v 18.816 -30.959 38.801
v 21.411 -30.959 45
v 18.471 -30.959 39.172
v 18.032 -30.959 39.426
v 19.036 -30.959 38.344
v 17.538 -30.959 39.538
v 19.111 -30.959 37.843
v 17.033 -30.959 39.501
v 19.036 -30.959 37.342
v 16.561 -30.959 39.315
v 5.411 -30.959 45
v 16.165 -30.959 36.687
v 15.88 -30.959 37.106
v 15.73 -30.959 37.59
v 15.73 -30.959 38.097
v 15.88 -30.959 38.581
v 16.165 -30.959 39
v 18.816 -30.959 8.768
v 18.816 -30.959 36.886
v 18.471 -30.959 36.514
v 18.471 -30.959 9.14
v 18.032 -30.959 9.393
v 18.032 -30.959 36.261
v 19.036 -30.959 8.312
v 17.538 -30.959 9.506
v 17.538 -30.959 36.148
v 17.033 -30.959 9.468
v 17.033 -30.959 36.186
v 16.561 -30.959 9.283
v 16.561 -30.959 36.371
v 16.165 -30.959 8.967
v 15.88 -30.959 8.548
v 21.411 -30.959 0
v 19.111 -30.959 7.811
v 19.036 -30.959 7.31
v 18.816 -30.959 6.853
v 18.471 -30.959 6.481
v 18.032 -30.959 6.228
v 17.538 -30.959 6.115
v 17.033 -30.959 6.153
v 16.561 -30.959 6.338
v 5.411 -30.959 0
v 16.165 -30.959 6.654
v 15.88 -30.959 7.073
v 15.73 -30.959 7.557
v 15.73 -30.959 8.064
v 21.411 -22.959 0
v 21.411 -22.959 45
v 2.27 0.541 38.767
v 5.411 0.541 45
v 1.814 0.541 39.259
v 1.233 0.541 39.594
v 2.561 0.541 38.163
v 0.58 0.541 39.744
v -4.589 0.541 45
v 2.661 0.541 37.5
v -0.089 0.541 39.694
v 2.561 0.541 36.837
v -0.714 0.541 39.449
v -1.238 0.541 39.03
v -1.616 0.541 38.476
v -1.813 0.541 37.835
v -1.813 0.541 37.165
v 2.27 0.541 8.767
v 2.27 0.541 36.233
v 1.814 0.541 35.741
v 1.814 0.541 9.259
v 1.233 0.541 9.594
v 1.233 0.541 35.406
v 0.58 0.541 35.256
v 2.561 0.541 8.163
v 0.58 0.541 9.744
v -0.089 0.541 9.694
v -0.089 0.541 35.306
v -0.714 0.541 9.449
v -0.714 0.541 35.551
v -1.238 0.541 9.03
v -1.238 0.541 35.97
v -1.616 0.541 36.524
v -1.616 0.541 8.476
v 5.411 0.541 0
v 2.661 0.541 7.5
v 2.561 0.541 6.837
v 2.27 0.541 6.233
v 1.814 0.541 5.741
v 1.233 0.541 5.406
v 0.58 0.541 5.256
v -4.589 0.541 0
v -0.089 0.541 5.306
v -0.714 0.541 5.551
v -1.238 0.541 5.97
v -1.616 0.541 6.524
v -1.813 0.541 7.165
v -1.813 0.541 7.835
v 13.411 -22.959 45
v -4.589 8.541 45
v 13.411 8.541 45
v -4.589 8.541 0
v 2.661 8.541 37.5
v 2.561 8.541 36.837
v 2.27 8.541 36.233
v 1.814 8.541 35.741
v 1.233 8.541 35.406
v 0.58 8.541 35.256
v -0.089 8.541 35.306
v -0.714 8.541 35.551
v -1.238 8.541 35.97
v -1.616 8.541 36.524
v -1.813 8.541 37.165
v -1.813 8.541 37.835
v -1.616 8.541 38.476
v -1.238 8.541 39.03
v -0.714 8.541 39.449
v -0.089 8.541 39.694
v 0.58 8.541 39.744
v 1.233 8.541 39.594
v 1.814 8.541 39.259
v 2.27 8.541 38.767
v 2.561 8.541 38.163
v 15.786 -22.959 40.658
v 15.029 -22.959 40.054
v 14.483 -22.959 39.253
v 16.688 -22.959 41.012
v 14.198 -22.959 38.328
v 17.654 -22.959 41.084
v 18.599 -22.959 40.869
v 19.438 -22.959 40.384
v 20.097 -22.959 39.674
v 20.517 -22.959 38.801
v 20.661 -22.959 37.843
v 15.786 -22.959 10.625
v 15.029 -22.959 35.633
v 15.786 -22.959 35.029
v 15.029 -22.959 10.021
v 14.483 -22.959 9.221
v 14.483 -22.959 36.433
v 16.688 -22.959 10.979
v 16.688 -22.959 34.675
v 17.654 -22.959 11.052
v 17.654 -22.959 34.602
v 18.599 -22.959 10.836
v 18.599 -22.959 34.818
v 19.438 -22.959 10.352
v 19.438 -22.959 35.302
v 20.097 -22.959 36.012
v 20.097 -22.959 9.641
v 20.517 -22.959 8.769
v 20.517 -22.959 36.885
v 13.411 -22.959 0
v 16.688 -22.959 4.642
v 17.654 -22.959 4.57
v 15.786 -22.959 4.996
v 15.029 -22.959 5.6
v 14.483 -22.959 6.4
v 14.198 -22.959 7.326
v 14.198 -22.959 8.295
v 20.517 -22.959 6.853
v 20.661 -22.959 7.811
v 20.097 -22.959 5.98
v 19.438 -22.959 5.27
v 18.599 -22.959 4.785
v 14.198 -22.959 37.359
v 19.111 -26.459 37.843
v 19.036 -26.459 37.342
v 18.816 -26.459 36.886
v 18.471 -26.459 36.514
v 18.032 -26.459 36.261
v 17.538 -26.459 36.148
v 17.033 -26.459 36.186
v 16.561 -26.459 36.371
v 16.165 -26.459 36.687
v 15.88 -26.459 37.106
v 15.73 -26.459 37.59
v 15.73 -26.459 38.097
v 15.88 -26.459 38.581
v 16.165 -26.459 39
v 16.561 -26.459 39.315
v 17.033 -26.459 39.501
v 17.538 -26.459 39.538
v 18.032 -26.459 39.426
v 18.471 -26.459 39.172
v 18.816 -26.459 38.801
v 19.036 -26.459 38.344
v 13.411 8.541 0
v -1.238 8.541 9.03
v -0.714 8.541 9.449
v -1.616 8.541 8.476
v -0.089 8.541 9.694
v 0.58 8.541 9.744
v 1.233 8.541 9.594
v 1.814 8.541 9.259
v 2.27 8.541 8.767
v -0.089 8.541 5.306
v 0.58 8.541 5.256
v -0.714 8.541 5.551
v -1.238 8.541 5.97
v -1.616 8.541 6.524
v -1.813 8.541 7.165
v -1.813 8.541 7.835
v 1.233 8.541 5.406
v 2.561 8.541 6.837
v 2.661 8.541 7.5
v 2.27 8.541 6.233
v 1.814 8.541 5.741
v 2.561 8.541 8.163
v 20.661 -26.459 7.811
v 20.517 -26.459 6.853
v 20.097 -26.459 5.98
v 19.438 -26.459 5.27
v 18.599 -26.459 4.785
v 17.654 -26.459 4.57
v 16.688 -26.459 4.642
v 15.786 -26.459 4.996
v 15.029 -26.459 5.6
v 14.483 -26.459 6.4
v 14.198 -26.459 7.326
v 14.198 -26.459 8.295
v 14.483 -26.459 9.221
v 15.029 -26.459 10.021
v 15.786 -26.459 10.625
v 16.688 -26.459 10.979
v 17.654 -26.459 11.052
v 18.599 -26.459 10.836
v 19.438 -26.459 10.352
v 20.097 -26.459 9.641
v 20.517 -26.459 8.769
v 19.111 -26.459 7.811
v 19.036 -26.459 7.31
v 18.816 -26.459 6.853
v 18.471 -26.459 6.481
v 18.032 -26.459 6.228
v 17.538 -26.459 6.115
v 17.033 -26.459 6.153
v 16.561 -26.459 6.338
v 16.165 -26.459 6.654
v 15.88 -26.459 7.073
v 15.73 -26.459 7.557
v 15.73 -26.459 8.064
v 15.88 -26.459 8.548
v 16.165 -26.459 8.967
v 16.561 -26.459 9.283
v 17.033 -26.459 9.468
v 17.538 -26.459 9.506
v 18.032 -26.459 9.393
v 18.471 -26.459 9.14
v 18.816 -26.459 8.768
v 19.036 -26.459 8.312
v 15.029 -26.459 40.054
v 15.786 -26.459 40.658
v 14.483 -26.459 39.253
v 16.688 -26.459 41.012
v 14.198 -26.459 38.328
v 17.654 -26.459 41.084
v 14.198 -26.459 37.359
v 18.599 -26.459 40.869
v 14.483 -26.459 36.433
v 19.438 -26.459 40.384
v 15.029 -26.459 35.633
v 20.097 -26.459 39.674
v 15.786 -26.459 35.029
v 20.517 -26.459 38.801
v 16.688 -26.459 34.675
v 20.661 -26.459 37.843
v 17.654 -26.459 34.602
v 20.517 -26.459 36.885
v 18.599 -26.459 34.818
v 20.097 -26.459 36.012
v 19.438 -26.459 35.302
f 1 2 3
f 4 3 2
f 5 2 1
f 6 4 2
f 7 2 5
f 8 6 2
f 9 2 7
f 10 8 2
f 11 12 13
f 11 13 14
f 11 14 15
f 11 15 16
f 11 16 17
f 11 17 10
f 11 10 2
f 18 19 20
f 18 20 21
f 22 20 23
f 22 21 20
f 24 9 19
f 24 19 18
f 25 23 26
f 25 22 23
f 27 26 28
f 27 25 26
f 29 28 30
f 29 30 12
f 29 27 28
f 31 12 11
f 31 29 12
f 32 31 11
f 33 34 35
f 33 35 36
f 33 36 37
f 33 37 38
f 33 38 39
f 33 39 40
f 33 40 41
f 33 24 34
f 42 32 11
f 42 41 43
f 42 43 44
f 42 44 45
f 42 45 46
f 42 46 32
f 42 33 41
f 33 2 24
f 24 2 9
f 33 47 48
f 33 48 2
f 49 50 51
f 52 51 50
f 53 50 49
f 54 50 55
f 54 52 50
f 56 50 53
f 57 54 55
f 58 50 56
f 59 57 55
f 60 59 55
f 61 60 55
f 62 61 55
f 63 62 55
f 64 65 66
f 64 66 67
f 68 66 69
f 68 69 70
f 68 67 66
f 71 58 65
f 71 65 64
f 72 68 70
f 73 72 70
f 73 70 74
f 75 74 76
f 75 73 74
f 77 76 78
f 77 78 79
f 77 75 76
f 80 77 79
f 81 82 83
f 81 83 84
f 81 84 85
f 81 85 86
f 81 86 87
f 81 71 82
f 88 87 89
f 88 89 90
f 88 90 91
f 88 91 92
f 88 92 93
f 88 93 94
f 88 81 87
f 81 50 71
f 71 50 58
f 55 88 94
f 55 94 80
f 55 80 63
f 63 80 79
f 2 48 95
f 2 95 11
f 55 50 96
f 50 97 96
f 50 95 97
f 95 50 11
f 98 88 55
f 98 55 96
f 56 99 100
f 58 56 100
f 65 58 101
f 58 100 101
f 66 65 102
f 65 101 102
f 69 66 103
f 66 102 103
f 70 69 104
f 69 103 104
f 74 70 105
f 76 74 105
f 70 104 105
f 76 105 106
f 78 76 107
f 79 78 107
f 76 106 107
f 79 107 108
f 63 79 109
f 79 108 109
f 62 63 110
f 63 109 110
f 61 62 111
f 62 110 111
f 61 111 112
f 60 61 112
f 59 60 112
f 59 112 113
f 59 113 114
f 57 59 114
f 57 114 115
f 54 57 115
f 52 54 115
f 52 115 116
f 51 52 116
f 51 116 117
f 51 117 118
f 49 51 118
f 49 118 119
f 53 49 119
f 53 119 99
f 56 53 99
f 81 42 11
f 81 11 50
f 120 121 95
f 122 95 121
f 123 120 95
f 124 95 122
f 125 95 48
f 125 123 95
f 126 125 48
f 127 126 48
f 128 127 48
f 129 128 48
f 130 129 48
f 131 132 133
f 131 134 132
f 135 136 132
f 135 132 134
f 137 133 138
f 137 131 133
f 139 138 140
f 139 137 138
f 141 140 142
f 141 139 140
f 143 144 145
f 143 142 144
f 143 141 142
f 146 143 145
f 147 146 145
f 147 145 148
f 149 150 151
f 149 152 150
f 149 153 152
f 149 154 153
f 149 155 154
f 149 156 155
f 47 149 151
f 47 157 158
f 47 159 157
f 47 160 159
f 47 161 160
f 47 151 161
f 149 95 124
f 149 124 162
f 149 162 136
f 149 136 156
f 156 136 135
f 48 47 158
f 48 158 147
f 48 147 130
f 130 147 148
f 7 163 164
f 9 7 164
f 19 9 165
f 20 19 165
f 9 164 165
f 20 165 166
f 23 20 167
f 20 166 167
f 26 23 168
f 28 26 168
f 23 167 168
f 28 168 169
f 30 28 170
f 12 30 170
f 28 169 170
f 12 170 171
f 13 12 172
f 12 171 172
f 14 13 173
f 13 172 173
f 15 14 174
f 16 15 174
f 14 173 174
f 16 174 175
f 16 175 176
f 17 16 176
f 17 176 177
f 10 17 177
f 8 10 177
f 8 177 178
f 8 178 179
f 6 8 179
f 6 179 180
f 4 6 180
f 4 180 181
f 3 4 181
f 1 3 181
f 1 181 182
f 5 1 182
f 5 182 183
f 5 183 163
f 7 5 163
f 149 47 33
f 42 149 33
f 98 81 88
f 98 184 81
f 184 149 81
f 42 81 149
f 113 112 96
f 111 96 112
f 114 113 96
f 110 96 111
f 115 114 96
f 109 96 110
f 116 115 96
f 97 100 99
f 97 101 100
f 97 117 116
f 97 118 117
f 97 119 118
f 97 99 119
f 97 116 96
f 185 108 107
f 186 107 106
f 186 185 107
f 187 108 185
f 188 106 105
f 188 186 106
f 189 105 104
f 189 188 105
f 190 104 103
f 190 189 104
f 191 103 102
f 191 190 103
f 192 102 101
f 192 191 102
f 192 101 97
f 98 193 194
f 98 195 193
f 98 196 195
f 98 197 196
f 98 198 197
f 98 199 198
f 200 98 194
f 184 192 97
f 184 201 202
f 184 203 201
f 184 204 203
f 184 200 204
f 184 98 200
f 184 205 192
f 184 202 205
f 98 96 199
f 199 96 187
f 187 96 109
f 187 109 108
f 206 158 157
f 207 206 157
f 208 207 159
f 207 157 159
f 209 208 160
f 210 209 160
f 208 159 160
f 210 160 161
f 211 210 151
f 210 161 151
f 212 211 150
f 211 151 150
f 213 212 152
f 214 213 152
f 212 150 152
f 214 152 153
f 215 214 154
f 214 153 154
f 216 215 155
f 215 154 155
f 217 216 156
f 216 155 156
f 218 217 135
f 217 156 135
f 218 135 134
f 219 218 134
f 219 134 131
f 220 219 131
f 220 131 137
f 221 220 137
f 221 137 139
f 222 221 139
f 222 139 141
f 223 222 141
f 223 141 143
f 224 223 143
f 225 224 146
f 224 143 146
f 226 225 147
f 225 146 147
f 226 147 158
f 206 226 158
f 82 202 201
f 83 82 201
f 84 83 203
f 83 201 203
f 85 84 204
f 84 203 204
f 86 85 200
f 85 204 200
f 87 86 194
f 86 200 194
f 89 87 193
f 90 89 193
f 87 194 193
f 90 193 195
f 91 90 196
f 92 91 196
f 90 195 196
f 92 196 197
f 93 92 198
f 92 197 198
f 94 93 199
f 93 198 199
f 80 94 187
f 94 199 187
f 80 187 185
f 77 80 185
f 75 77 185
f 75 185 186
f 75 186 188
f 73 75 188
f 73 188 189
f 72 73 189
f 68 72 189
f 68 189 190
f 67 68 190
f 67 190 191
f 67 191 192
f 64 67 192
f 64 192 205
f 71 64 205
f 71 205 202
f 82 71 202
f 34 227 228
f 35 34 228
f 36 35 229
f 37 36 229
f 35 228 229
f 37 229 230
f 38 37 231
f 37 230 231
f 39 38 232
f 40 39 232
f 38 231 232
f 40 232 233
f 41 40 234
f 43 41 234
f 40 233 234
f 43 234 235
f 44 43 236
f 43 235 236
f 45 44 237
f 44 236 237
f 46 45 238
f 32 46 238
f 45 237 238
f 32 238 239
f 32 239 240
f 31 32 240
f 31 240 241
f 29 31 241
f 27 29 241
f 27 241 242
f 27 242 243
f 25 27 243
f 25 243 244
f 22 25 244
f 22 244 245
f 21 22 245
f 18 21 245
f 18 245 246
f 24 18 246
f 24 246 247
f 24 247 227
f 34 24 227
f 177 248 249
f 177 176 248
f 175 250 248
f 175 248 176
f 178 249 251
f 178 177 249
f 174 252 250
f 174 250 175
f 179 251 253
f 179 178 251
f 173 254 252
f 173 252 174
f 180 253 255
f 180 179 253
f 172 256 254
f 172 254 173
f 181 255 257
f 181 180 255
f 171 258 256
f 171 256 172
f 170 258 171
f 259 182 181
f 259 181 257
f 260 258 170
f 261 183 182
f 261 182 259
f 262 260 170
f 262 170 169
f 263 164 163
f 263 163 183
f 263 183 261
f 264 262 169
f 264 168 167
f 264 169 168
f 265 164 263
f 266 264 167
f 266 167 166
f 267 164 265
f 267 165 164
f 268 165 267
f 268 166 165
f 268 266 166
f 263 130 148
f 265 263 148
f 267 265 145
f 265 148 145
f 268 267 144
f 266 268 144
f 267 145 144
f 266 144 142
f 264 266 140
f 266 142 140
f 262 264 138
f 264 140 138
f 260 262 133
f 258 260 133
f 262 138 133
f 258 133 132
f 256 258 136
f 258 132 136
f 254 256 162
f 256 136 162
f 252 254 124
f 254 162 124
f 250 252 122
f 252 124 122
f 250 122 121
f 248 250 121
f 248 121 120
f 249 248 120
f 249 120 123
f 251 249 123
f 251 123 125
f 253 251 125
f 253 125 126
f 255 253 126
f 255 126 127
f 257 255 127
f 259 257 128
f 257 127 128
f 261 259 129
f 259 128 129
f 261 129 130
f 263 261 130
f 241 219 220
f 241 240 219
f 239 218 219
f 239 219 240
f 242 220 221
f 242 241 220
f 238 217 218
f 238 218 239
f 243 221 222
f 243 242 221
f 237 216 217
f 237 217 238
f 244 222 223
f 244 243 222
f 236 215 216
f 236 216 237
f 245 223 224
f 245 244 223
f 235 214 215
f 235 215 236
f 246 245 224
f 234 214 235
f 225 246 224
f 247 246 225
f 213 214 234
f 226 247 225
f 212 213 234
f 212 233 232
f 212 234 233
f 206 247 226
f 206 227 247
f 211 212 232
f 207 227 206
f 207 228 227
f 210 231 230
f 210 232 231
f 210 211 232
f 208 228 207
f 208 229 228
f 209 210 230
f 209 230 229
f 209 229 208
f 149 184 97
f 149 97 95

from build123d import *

# Parameters (mm, degrees)
BOSS_EXTRUDE1_DEPTH = 45
SKETCH2_R           = 2.25
CUT_EXTRUDE1_DEPTH  = 45
SKETCH3_R           = 1.7
CUT_EXTRUDE2_DEPTH  = 45
SKETCH4_R           = 3.25
CUT_EXTRUDE3_DEPTH  = 3.5


with BuildPart() as part:
    # Sketch1 → Boss-Extrude1 (new body)
    with BuildSketch(Plane.XY):
        Polygon((-4.588607595, 8.541139241), (13.411392405, 8.541139241), (13.411392405, -22.958860759), (21.411392405, -22.958860759), (21.411392405, -30.958860759), (5.411392405, -30.958860759), (5.411392405, 0.541139241), (-4.588607595, 0.541139241), align=None)
    extrude(amount=BOSS_EXTRUDE1_DEPTH)

    # Sketch2 → Cut-Extrude1 (cut)
    with BuildSketch(Plane(origin=(0, 8.541139241, 0), x_dir=(1, 0, 0), z_dir=(0, 1, 0))):
        with Locations((0.411392405, -7.5)):
            Circle(SKETCH2_R)
        with Locations((0.411392405, -37.5)):
            Circle(SKETCH2_R)
    extrude(amount=-CUT_EXTRUDE1_DEPTH, mode=Mode.SUBTRACT)

    # Sketch3 → Cut-Extrude2 (cut)
    with BuildSketch(Plane(origin=(0, -22.958860759, 0), x_dir=(1, 0, 0), z_dir=(0, 1, 0))):
        with Locations((17.411392405, -7.810599517)):
            Circle(SKETCH3_R)
        with Locations((17.411392405, -37.843221269)):
            Circle(SKETCH3_R)
    extrude(amount=-CUT_EXTRUDE2_DEPTH, mode=Mode.SUBTRACT)

    # Sketch4 → Cut-Extrude3 (cut)
    with BuildSketch(Plane(origin=(0, -22.958860759, 0), x_dir=(1, 0, 0), z_dir=(0, 1, 0))):
        with Locations((17.411392405, -7.810599517)):
            Circle(SKETCH4_R)
        with Locations((17.411392405, -37.843221269)):
            Circle(SKETCH4_R)
    extrude(amount=-CUT_EXTRUDE3_DEPTH, mode=Mode.SUBTRACT)


solid = part.part
